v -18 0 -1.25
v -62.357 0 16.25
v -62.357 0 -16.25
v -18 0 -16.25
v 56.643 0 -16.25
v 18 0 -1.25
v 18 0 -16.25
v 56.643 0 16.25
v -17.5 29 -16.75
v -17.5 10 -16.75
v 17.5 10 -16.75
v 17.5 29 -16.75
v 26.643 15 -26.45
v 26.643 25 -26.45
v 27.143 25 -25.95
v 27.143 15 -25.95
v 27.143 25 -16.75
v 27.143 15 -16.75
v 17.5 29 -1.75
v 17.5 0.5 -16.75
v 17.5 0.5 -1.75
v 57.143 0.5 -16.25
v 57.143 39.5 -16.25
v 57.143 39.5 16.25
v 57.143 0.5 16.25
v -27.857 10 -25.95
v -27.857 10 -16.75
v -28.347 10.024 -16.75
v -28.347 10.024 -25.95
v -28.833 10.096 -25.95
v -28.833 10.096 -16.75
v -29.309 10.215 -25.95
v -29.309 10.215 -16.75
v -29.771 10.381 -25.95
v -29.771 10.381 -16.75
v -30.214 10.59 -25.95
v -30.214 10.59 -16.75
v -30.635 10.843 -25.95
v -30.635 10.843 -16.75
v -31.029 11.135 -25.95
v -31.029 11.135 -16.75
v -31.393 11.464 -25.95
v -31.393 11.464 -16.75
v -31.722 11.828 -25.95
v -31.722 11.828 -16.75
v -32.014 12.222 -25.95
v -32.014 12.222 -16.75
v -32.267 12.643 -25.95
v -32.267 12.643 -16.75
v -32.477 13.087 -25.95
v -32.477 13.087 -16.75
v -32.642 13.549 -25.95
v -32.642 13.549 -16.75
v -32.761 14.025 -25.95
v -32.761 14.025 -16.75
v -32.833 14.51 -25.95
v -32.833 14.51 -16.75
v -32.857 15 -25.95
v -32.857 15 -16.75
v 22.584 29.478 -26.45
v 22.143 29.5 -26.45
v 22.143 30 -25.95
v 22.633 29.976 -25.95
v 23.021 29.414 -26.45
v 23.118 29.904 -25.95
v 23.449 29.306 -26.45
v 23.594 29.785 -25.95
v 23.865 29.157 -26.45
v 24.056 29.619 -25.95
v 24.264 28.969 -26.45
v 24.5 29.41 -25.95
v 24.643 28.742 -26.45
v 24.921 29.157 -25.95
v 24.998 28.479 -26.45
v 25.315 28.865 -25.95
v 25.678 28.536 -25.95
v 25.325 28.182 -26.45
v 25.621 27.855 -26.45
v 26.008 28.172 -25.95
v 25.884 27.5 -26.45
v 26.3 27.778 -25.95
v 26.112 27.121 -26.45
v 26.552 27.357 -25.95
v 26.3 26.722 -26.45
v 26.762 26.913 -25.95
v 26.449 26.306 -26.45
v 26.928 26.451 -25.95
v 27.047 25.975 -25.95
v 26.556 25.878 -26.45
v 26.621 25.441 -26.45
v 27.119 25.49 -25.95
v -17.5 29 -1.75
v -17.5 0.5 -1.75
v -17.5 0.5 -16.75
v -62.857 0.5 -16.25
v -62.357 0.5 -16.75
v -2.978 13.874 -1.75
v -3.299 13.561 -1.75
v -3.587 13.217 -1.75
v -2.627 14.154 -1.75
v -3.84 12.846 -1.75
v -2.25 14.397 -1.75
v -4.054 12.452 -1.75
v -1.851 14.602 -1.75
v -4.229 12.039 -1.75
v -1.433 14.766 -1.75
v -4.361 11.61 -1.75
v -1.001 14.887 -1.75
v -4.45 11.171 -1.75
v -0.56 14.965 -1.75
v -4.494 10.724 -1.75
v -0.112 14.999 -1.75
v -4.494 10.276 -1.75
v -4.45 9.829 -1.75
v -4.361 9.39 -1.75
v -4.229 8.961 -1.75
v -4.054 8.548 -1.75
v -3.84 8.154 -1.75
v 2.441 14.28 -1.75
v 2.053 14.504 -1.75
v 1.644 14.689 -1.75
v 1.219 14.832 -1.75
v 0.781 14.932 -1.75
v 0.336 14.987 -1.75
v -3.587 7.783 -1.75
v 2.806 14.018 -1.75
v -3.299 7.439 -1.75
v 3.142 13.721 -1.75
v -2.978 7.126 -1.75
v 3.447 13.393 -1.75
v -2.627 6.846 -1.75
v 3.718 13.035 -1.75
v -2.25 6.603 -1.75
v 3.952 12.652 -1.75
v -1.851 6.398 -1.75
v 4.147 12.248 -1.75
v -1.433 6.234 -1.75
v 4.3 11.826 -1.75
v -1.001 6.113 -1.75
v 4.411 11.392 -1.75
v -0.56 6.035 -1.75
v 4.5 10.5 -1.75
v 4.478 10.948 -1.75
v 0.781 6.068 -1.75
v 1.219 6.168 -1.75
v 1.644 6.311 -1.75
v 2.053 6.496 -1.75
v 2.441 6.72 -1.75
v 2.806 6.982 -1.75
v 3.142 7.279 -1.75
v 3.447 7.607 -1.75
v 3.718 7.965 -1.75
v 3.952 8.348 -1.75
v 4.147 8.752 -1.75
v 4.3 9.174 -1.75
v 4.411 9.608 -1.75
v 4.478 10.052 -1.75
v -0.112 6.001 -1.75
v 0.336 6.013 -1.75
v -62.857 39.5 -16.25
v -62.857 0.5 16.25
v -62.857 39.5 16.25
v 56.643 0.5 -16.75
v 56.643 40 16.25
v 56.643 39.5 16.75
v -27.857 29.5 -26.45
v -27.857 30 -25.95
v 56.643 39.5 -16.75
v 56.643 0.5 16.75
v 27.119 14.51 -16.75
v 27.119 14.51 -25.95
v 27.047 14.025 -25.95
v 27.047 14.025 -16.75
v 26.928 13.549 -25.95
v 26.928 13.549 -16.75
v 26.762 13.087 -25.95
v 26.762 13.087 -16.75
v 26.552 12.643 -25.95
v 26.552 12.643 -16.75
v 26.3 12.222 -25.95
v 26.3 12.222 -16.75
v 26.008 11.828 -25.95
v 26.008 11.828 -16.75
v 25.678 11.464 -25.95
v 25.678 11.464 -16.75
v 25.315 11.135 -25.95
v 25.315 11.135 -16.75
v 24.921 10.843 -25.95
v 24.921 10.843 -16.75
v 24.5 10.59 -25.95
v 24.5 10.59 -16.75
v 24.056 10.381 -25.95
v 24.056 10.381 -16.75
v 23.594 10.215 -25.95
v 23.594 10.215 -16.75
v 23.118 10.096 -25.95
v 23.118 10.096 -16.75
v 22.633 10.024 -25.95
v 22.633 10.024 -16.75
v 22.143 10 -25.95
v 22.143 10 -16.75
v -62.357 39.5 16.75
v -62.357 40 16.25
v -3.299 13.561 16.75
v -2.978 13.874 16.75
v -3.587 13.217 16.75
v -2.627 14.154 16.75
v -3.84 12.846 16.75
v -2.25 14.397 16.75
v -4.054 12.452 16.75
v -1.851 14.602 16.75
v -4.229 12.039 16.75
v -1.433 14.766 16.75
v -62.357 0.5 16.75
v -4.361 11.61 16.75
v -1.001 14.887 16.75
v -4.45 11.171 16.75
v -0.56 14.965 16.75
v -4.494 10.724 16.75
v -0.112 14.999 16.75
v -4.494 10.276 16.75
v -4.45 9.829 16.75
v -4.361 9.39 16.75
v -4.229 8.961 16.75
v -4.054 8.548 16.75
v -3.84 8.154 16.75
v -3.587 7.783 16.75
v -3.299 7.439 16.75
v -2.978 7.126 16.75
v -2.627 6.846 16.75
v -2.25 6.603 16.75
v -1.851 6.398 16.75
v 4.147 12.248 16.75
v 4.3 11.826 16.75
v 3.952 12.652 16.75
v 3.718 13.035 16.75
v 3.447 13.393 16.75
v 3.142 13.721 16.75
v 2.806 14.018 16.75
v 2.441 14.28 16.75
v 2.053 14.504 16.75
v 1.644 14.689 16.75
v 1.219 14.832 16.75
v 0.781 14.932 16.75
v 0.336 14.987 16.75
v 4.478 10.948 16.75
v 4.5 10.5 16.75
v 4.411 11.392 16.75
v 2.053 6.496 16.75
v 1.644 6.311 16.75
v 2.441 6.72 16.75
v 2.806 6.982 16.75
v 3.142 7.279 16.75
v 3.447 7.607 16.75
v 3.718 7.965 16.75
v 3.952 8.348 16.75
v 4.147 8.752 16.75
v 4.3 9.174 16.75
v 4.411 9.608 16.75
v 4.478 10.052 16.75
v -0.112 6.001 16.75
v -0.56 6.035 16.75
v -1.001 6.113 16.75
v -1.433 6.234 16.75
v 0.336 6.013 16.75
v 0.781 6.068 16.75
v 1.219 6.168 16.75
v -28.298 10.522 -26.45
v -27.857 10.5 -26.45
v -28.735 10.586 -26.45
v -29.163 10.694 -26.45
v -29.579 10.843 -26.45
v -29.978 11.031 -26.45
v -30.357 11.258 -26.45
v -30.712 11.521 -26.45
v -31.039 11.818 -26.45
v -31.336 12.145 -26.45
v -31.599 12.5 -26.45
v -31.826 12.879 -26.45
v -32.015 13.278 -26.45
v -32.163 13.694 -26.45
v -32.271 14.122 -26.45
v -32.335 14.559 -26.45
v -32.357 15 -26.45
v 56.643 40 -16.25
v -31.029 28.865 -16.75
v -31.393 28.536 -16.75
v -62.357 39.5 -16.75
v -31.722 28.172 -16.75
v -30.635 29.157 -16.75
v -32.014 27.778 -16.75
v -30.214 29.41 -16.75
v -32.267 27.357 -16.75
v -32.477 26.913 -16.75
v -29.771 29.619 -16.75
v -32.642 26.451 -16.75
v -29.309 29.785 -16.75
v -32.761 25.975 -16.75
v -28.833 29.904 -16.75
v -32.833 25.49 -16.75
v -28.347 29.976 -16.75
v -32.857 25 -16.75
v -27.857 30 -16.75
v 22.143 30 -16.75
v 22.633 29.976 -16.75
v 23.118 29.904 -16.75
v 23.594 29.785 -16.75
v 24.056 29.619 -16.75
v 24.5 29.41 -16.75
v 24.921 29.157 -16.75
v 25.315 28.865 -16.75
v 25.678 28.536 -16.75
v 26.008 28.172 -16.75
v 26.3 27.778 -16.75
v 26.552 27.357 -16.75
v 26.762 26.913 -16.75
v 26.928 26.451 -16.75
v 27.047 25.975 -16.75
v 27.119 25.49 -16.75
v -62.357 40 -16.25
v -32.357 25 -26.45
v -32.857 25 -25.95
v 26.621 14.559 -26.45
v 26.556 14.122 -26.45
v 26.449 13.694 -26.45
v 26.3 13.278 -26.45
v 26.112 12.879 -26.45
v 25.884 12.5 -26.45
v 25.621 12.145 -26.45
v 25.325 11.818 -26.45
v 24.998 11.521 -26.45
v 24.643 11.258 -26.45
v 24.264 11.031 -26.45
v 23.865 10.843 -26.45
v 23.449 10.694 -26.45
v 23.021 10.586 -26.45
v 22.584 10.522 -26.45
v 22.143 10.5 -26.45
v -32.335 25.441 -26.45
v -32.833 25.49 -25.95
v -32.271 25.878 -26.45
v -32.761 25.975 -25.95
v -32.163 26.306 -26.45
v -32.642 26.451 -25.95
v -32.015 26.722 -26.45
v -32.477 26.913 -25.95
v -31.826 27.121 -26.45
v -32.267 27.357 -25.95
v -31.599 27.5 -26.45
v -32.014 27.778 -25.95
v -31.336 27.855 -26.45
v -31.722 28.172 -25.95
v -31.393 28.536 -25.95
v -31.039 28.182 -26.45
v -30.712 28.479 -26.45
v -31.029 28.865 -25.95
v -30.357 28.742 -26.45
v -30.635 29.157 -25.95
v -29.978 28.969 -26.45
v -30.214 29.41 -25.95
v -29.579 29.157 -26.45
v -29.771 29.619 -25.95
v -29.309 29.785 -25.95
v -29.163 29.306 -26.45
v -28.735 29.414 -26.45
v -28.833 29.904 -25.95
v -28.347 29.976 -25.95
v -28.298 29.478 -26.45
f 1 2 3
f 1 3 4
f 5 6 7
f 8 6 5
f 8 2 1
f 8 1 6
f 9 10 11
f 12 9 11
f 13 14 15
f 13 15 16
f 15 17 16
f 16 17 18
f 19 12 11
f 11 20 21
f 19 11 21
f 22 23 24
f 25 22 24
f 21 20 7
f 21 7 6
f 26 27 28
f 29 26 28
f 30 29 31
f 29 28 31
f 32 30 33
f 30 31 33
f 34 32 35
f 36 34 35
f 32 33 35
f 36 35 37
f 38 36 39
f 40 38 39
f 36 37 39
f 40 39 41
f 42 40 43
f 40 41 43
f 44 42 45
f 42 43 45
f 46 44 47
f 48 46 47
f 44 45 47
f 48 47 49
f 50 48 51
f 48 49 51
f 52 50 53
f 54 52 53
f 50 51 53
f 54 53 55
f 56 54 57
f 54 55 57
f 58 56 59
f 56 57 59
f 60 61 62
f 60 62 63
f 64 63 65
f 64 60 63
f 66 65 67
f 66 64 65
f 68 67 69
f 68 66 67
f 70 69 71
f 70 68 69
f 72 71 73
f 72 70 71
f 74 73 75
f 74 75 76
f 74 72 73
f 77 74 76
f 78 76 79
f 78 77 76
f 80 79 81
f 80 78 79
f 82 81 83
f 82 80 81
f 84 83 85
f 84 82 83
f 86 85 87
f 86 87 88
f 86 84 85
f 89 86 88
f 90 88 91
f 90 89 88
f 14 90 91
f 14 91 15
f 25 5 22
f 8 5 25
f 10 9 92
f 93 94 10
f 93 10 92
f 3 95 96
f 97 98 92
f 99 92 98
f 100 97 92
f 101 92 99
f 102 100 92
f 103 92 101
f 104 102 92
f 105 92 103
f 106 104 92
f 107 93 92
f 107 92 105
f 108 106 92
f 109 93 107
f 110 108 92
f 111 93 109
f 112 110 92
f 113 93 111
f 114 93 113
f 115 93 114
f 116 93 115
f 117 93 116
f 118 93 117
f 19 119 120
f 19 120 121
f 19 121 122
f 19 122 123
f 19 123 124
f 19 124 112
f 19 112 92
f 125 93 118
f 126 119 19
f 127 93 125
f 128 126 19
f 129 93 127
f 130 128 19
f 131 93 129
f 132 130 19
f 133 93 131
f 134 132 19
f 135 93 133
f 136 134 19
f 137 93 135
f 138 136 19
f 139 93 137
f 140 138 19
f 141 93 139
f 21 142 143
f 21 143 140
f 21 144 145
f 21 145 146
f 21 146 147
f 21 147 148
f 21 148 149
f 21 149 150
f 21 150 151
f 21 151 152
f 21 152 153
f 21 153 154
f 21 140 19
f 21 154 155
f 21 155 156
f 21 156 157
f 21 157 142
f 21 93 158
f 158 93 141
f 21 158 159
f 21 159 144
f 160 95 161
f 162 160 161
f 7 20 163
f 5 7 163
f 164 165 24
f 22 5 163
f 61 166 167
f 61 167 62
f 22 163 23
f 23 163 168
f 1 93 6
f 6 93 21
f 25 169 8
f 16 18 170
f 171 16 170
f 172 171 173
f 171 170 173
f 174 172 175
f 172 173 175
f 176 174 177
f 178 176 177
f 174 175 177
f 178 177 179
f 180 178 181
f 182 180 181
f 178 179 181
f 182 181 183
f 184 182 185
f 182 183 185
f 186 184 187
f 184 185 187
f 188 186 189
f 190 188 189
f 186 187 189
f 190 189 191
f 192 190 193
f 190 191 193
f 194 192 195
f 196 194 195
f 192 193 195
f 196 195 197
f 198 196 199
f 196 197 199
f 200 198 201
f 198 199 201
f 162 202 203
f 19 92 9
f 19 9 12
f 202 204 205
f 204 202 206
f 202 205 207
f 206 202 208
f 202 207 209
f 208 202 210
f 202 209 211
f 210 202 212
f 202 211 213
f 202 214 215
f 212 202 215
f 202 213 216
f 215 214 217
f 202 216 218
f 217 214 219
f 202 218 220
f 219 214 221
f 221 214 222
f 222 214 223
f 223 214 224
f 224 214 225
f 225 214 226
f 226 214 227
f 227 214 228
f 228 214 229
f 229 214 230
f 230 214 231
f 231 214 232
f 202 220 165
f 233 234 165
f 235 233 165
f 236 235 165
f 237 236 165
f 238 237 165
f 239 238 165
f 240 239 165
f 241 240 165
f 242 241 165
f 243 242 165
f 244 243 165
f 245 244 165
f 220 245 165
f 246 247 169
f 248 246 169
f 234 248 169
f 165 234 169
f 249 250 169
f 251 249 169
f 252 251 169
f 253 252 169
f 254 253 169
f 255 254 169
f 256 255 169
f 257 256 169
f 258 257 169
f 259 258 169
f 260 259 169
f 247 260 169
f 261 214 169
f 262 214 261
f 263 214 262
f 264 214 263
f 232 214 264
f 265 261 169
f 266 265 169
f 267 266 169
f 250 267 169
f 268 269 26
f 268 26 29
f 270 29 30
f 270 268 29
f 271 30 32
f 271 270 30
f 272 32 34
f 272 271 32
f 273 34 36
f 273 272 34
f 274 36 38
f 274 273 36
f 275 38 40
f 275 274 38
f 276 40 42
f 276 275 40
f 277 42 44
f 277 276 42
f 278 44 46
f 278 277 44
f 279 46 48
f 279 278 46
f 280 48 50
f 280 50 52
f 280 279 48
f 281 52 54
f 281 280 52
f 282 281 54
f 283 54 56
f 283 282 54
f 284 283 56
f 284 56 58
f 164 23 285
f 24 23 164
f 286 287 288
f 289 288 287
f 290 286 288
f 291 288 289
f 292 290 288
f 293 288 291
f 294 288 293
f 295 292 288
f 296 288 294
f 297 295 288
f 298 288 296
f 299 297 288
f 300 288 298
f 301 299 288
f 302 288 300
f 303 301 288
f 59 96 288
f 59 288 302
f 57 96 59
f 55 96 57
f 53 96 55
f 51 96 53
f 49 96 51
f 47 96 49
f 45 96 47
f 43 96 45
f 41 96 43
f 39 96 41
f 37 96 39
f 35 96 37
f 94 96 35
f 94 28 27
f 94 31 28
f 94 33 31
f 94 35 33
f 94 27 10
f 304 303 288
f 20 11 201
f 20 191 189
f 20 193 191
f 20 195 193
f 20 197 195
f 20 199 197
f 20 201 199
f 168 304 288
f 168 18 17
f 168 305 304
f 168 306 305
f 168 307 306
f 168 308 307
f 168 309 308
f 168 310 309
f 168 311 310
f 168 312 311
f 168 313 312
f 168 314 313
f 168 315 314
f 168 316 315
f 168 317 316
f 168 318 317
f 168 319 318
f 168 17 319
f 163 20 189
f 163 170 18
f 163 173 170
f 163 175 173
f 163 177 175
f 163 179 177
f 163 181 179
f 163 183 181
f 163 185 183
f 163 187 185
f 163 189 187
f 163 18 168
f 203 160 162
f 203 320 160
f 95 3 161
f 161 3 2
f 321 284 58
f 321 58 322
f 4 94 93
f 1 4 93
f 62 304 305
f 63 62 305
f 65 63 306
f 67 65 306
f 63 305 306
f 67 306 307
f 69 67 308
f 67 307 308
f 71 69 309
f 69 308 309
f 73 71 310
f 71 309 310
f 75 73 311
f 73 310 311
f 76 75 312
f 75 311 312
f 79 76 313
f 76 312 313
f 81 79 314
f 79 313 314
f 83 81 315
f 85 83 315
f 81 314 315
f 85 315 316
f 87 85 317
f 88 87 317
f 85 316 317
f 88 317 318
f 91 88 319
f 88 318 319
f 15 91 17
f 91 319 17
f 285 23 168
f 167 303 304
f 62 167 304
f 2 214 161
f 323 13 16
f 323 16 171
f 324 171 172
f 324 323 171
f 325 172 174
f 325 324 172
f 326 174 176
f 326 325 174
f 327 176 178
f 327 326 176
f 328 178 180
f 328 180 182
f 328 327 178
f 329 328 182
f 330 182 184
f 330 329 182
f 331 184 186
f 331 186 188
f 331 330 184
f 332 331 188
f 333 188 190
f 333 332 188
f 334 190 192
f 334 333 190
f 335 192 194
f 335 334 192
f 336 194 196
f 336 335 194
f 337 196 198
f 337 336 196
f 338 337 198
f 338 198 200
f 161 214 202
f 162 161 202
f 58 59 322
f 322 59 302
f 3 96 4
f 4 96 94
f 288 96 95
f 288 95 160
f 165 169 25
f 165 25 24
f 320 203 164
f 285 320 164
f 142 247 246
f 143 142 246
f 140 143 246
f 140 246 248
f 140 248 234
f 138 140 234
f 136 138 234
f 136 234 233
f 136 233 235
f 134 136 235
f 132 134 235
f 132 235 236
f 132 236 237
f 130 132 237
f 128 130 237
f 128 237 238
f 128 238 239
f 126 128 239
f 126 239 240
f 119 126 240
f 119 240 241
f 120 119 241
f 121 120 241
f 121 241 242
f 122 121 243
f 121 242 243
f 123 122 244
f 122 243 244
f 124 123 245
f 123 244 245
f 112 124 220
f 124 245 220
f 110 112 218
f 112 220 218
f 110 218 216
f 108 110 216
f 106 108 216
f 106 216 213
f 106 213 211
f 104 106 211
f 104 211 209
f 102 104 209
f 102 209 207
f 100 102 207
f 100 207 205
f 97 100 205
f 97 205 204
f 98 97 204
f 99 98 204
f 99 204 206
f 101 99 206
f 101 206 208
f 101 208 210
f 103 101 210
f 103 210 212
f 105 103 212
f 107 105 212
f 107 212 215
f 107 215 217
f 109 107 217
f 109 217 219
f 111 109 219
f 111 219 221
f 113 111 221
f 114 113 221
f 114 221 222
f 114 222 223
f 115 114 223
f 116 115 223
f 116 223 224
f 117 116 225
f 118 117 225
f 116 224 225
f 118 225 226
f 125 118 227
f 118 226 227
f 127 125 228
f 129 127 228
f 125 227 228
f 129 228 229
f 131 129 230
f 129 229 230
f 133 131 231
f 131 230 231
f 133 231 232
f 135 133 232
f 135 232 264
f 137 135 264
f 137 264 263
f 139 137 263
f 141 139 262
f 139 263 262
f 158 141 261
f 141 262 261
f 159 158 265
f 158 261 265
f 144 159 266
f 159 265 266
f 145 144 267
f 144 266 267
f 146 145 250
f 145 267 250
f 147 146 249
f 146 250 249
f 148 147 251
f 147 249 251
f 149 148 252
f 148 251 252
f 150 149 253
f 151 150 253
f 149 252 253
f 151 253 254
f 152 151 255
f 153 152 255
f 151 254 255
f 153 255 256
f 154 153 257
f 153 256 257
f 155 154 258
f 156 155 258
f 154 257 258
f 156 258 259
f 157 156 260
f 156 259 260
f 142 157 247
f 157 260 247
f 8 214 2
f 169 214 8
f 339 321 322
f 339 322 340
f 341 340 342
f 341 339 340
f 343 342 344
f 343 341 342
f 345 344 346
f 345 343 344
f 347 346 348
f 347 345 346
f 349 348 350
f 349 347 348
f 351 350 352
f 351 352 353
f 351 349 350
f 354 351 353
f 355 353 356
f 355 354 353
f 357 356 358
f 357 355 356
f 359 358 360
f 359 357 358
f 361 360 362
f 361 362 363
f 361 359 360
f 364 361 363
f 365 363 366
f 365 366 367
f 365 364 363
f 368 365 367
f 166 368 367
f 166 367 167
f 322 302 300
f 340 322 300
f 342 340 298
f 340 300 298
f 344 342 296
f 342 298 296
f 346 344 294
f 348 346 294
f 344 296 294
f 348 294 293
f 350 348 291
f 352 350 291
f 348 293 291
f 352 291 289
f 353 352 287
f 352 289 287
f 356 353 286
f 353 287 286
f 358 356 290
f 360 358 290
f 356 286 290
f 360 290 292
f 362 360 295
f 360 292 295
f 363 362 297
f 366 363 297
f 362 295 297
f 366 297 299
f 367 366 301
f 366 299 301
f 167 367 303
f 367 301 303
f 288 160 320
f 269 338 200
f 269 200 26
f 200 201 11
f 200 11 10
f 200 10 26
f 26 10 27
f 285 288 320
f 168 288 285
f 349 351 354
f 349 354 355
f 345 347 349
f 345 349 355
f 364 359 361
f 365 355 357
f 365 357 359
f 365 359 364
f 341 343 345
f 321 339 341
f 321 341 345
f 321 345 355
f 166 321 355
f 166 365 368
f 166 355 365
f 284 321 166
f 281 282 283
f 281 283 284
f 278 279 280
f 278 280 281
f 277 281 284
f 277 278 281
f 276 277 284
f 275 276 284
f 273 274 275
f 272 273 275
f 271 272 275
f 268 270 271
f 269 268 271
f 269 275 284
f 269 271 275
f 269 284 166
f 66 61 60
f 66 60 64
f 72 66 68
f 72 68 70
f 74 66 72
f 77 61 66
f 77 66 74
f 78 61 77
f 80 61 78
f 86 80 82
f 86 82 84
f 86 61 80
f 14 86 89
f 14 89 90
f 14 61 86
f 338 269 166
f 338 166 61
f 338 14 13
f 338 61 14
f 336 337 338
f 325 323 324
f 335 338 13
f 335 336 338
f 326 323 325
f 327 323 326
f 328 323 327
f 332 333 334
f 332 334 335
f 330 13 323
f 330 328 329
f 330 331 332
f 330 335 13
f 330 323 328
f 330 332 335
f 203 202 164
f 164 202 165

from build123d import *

# Parameters (mm, degrees)
F0_W     = 120
F0_H     = 33.5
F1_DEPTH = 40
F4_DEPTH = 9.7
F5_R     = 4.5
F6_DEPTH = 33.5
F7_W     = 35
F7_H     = 15
F8_DEPTH = 29
F9_SIZE  = 0.5
F10_SIZE = 0.5


with BuildPart() as f1:
    # F0 (on Front) → F1 (new body)
    with BuildSketch(Plane.XZ):
        with Locations((-2.857143, 0)):
            Rectangle(F0_W, F0_H)
    extrude(amount=-F1_DEPTH)

    # F3 (on face) → F4 (join)
    with BuildSketch(Plane(origin=(0, 0, -16.75), x_dir=(1, 0, 0), z_dir=(0, 0, -1))):
        with BuildLine():
            ThreePointArc((27.142857, -15), (25.678391, -11.464466), (22.142857, -10))
            Line((22.142857, -10), (-27.857143, -10))
            ThreePointArc((-27.857143, -10), (-31.392677, -11.464466), (-32.857143, -15))
            Line((-32.857143, -15), (-32.857143, -25))
            ThreePointArc((-32.857143, -25), (-31.392677, -28.535534), (-27.857143, -30))
            Line((-27.857143, -30), (22.142857, -30))
            ThreePointArc((22.142857, -30), (25.678391, -28.535534), (27.142857, -25))
            Line((27.142857, -25), (27.142857, -15))
        make_face()
    extrude(amount=F4_DEPTH)

    # F5 (on face) → F6 (cut)
    with BuildSketch(Plane.XY.offset(16.75)):
        with Locations((0, 10.5)):
            Circle(F5_R)
    extrude(amount=-F6_DEPTH, mode=Mode.SUBTRACT)

    # F7 (on face) → F8 (cut)
    with BuildSketch(Plane.XZ):
        with Locations((0, -9.25)):
            Rectangle(F7_W, F7_H)
    extrude(amount=-F8_DEPTH, mode=Mode.SUBTRACT)

    # F9
    f9_edges = [f1.edges().sort_by_distance(p)[0] for p in [
        (-2.857143, 0, 16.75),
        (57.142857, 20, 16.75),
        (-2.857143, 40, 16.75),
        (-62.857143, 20, 16.75),
        (-62.857143, 0, 0),
        (57.142857, 0, 0),
        (57.142857, 40, 0),
        (-62.857143, 40, 0),
        (-62.857143, 20, -16.75),
        (-40.178572, 0, -16.75),
        (37.321428, 0, -16.75),
        (-17.5, 0, -9.25),
        (0, 0, -1.75),
        (17.5, 0, -9.25),
        (57.142857, 20, -16.75),
        (-2.857143, 40, -16.75),
    ]]
    chamfer(f9_edges, length=F9_SIZE)

    # F10
    f10_edges = [f1.edges().sort_by_distance(p)[0] for p in [
        (-2.857143, 10, -26.45),
    ]]
    chamfer(f10_edges, length=F10_SIZE)


solid = f1.part
